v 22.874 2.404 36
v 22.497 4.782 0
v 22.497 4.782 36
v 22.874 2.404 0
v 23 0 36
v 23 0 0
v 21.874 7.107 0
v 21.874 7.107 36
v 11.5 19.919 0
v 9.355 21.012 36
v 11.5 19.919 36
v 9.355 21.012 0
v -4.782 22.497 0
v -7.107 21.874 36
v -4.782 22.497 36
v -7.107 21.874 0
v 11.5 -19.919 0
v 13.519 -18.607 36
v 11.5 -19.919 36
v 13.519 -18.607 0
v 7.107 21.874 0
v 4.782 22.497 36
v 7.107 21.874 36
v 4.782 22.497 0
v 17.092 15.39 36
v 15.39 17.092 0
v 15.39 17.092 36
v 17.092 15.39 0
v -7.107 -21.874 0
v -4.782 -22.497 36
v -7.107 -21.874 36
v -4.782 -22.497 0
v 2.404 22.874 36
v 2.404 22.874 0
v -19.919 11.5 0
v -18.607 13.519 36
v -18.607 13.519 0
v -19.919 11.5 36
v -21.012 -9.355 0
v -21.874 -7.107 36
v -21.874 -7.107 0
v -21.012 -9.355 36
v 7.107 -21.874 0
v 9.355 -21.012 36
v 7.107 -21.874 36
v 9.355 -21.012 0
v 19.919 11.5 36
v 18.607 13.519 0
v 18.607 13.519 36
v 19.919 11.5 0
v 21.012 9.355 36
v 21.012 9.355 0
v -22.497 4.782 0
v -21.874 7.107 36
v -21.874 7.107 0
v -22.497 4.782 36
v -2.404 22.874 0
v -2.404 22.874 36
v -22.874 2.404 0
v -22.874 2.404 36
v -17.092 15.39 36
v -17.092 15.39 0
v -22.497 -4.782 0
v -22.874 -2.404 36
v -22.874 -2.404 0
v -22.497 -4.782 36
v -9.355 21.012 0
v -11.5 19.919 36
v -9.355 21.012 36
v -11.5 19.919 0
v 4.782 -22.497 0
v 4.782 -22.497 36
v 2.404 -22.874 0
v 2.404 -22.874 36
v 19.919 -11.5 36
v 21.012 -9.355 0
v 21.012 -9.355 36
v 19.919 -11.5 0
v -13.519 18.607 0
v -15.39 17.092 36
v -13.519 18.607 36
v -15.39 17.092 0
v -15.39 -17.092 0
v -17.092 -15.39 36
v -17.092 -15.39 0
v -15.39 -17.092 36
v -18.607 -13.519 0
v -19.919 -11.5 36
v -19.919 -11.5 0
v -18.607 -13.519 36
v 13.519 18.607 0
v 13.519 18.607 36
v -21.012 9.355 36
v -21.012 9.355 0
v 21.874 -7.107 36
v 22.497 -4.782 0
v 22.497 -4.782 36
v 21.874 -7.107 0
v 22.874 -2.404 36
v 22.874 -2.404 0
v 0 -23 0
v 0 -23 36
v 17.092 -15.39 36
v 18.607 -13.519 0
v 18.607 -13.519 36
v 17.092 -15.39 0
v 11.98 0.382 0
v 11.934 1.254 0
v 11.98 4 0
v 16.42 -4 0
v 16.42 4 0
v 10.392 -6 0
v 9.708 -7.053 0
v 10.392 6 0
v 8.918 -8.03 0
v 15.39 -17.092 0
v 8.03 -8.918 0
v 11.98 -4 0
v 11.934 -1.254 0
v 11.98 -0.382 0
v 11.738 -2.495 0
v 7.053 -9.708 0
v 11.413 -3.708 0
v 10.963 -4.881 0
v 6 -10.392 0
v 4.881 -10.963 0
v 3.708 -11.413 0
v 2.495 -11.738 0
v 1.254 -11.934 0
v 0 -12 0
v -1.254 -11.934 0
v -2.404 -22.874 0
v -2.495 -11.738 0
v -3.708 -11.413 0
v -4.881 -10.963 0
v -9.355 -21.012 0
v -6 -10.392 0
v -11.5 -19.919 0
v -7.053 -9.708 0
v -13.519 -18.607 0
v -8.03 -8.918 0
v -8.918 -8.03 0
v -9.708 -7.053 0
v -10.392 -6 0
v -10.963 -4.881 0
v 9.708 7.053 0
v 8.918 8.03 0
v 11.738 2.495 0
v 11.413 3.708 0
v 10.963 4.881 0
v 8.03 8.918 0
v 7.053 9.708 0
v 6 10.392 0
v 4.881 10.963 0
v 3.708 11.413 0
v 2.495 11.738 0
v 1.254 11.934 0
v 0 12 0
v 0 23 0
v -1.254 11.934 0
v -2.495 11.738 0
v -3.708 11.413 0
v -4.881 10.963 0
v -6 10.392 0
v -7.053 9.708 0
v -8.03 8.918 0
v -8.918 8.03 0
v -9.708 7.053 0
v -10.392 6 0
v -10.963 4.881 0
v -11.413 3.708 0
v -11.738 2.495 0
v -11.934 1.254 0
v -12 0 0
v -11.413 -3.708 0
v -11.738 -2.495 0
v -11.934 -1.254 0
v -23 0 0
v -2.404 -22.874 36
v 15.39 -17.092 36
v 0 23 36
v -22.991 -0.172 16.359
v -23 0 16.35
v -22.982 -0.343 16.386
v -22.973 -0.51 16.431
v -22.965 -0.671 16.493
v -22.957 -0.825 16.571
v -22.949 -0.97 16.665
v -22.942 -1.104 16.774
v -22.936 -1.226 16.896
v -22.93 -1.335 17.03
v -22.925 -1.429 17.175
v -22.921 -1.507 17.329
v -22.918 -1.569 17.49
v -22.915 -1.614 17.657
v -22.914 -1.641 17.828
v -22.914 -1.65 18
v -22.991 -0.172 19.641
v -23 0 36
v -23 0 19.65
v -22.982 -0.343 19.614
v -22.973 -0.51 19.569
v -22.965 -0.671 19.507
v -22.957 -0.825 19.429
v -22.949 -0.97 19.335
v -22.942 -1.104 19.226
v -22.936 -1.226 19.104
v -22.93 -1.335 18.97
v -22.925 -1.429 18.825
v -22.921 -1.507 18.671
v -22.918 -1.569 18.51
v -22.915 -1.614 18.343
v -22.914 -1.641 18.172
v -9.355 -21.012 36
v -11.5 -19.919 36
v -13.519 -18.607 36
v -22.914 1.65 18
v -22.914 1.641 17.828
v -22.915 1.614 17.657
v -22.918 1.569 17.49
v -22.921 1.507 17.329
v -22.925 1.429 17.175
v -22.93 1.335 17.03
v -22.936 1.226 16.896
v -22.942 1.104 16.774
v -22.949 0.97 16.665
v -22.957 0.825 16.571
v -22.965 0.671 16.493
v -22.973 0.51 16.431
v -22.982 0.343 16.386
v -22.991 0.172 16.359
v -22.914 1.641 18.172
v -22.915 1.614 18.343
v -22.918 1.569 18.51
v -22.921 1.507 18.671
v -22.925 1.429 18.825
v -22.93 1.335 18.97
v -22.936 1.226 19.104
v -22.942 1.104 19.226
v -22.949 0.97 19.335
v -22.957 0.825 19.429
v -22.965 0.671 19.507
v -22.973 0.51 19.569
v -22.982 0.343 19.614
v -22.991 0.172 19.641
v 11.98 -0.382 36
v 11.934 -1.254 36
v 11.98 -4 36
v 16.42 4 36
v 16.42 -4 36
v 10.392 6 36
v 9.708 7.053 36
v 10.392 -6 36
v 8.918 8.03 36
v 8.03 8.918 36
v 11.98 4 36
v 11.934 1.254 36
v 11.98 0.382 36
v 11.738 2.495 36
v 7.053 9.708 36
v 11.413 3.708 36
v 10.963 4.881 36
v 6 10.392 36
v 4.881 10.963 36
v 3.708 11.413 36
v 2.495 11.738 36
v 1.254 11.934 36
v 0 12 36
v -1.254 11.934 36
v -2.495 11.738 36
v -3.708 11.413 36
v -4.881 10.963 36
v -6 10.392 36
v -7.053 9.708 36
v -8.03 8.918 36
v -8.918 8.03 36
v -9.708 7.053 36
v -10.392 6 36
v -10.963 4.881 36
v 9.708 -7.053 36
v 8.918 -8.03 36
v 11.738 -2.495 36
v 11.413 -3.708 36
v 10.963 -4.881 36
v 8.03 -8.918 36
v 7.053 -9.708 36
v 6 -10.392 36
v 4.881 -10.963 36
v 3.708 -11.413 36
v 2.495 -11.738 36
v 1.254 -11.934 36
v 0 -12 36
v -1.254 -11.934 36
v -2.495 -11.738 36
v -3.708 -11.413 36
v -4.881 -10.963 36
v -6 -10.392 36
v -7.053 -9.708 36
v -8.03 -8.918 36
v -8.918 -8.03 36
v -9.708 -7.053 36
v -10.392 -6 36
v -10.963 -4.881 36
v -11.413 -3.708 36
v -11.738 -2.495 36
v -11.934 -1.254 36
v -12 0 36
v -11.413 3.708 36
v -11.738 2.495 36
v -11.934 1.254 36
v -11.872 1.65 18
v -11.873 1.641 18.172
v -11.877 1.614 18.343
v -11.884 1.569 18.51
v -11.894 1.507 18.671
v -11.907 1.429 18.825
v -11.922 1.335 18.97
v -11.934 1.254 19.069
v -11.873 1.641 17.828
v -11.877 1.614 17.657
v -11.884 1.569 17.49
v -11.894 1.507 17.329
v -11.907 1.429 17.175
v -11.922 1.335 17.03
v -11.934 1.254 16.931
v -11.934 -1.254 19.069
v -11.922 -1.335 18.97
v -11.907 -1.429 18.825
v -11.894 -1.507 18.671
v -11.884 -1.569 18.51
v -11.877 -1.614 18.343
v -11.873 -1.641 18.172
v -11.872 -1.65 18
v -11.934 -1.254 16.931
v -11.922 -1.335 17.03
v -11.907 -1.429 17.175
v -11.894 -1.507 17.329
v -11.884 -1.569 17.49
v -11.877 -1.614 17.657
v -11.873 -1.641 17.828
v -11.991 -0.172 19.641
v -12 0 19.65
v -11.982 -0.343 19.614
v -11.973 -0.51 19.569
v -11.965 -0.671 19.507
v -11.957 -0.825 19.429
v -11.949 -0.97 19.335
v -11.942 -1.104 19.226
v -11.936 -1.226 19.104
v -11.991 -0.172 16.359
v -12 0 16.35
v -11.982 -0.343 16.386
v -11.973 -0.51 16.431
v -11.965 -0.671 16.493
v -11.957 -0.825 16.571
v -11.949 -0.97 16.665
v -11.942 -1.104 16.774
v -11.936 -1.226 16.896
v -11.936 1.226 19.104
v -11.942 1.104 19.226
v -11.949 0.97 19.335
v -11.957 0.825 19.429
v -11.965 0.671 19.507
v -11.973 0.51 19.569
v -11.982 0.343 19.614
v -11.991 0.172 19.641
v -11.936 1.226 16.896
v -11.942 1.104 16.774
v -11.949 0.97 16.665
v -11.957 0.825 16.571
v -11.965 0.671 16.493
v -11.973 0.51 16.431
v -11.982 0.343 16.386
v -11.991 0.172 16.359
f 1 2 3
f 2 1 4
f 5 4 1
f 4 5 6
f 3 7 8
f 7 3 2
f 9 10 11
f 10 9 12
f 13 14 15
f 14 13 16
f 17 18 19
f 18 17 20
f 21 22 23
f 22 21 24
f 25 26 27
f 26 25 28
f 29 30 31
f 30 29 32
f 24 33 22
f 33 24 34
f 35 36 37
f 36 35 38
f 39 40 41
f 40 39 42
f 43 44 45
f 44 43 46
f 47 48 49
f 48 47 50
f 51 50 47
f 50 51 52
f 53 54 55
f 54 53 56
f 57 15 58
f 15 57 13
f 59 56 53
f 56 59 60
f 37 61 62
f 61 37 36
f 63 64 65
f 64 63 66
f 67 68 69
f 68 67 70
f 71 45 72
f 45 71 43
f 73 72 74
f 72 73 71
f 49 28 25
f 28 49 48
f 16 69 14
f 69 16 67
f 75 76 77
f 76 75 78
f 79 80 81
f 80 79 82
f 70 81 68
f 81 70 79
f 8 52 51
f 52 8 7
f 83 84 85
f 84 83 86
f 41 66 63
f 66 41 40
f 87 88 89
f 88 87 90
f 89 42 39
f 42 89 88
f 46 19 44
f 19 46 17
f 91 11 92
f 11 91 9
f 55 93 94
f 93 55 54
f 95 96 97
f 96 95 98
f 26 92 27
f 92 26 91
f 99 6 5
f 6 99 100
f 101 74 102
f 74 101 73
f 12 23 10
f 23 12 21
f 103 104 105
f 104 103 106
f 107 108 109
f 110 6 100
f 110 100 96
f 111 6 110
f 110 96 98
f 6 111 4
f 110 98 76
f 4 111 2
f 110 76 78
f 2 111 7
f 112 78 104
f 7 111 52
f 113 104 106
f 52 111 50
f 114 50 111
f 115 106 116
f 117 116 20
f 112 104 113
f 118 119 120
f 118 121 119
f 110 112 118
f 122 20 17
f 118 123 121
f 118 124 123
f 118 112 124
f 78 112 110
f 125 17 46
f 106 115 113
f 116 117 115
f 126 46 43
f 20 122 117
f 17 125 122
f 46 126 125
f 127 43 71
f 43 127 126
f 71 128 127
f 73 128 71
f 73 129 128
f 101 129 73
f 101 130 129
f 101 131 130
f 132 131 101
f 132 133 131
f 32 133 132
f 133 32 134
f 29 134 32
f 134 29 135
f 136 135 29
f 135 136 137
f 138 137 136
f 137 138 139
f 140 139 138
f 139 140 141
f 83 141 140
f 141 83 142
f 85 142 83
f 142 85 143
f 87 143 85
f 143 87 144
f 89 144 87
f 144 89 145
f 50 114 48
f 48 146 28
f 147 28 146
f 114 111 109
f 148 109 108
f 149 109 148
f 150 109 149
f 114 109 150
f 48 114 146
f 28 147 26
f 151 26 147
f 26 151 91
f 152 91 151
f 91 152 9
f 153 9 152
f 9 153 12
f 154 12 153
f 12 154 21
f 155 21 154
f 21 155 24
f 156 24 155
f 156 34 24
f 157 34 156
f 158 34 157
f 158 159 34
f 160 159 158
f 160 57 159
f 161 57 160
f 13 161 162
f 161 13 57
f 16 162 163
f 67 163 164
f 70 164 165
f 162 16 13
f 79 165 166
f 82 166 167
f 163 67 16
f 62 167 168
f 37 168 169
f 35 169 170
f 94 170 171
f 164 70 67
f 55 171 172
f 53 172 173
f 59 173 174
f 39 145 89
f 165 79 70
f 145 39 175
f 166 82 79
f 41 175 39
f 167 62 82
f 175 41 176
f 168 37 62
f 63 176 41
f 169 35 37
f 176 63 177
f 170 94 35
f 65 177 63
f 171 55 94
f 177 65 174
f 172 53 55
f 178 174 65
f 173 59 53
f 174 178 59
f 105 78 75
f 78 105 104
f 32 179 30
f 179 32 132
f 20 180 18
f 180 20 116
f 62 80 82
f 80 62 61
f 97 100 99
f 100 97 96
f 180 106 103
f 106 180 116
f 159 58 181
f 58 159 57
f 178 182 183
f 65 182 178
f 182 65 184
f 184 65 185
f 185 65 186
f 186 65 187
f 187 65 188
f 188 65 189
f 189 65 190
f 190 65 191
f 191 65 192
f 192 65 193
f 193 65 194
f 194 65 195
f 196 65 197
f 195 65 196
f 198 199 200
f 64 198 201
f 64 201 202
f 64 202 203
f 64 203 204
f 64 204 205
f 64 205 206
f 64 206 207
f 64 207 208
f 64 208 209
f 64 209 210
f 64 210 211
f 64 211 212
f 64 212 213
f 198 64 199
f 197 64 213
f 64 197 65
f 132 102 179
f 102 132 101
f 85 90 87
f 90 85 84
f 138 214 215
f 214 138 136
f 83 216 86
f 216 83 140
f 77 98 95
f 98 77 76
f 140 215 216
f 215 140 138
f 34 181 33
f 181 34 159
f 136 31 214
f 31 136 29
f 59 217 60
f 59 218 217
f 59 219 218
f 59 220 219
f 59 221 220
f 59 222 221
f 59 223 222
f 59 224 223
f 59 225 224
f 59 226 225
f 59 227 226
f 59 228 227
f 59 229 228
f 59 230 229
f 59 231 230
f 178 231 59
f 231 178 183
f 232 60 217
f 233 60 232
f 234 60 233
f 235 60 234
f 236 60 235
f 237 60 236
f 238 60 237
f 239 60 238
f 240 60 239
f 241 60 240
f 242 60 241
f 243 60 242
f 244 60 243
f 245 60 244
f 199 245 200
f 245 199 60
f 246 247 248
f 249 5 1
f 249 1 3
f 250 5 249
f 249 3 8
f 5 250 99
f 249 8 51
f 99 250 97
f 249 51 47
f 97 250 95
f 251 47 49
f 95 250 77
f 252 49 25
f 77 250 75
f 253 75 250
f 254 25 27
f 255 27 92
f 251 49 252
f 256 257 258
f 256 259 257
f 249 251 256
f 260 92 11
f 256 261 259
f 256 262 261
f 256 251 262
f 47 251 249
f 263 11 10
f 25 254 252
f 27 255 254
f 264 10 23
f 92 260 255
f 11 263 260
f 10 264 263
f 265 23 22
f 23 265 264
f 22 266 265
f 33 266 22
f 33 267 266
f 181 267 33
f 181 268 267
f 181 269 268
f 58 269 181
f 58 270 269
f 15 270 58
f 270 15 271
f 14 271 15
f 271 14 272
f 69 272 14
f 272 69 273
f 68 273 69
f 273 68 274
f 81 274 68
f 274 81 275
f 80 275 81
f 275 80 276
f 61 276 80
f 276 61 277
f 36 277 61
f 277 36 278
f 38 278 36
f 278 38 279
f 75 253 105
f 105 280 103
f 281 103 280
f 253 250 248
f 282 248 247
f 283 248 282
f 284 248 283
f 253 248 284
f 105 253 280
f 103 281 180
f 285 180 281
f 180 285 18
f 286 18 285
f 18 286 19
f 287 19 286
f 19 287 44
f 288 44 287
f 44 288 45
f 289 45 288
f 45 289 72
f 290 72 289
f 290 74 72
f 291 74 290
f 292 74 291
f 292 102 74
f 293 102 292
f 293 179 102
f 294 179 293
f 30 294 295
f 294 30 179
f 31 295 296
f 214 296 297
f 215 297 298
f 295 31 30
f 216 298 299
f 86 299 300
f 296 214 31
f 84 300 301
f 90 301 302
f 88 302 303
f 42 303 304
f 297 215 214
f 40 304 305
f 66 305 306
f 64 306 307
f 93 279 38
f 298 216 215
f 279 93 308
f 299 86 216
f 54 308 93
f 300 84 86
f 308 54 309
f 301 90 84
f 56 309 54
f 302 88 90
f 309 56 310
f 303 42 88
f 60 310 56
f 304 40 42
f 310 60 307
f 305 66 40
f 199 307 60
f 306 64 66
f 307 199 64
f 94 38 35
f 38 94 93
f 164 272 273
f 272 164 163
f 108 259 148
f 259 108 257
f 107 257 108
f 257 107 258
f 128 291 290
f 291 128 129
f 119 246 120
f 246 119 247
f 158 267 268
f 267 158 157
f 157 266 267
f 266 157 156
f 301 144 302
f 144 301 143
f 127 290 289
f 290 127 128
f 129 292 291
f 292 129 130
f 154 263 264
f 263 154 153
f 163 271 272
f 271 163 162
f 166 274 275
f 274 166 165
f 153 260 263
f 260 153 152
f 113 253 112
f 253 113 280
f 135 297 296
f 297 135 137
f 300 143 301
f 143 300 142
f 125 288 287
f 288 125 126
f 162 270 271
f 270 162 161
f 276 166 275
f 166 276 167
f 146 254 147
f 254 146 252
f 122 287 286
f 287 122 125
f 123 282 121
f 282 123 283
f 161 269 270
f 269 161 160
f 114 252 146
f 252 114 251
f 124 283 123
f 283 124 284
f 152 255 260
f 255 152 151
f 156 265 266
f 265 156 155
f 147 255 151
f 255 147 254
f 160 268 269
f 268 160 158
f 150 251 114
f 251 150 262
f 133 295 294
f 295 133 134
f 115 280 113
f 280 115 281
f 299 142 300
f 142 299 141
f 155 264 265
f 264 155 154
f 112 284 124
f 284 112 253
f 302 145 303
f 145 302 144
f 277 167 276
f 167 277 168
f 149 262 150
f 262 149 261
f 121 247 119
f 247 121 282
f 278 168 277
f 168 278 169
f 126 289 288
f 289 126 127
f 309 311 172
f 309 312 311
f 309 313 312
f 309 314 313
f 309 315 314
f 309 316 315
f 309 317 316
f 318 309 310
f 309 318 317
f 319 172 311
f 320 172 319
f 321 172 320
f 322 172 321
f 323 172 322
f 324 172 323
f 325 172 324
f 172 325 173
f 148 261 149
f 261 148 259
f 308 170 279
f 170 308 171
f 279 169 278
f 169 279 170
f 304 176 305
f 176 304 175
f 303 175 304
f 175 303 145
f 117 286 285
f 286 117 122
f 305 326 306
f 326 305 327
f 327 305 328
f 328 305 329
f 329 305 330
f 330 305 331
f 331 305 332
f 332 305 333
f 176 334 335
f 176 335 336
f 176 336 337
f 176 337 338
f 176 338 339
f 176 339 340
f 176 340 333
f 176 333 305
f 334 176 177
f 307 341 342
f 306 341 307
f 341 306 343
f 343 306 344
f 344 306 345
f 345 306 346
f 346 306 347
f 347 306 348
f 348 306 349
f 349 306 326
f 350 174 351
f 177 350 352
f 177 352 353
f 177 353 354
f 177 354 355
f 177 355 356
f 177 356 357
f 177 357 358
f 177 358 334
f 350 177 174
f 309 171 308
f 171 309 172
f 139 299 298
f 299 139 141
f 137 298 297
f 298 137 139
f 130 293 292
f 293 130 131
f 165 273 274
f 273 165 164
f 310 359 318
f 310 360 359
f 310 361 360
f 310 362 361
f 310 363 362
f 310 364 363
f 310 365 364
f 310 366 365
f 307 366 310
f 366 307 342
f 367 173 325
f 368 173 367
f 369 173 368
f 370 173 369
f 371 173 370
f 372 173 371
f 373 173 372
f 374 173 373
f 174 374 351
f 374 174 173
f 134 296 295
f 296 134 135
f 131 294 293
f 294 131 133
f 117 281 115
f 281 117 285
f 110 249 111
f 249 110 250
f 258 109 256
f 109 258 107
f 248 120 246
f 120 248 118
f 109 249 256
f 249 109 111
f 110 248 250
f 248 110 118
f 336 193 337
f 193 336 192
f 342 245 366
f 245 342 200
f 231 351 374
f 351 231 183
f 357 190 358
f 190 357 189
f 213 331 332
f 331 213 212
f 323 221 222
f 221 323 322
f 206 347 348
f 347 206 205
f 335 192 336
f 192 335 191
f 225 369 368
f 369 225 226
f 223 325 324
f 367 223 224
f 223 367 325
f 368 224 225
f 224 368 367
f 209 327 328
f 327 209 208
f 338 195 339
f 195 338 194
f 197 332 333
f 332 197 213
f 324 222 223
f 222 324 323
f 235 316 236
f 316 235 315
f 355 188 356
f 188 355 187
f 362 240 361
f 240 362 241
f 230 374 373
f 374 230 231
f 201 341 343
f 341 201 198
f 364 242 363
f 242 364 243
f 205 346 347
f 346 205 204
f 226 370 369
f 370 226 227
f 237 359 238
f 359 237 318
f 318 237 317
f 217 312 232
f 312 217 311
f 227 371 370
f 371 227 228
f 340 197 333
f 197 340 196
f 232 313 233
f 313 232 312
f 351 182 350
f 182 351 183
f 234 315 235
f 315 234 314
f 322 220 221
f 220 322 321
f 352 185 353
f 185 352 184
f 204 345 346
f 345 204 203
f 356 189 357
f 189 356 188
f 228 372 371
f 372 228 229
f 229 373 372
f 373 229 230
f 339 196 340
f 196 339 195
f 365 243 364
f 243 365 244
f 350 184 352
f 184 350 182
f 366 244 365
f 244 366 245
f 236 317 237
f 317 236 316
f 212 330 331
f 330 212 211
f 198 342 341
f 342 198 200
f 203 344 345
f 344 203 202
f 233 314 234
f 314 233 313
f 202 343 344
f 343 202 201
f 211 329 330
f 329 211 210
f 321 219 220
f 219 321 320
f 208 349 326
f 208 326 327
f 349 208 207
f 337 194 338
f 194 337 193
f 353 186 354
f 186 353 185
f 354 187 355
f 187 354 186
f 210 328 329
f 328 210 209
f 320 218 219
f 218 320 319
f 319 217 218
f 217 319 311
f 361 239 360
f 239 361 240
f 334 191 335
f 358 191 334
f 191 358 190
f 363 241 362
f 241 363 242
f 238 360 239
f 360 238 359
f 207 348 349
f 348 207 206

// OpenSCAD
// Keyway hub for a 24 mm shaft.
$fn = 60;
eps = 0.02;
shaft_d = 24;
outer_d = 46;
length = 36;
key_w = 8;
key_depth = 4.4;
difference() {
    cylinder(d = outer_d, h = length);
    translate([0, 0, -eps]) cylinder(d = shaft_d, h = length + 2 * eps);
    translate([shaft_d / 2 - eps, -key_w / 2, -eps]) cube([key_depth + 2 * eps, key_w, length + 2 * eps]);
    translate([-outer_d / 2 - eps, 0, length / 2]) rotate([0, 90, 0]) cylinder(d = 3.3, h = outer_d / 2 + 2 * eps);
}
